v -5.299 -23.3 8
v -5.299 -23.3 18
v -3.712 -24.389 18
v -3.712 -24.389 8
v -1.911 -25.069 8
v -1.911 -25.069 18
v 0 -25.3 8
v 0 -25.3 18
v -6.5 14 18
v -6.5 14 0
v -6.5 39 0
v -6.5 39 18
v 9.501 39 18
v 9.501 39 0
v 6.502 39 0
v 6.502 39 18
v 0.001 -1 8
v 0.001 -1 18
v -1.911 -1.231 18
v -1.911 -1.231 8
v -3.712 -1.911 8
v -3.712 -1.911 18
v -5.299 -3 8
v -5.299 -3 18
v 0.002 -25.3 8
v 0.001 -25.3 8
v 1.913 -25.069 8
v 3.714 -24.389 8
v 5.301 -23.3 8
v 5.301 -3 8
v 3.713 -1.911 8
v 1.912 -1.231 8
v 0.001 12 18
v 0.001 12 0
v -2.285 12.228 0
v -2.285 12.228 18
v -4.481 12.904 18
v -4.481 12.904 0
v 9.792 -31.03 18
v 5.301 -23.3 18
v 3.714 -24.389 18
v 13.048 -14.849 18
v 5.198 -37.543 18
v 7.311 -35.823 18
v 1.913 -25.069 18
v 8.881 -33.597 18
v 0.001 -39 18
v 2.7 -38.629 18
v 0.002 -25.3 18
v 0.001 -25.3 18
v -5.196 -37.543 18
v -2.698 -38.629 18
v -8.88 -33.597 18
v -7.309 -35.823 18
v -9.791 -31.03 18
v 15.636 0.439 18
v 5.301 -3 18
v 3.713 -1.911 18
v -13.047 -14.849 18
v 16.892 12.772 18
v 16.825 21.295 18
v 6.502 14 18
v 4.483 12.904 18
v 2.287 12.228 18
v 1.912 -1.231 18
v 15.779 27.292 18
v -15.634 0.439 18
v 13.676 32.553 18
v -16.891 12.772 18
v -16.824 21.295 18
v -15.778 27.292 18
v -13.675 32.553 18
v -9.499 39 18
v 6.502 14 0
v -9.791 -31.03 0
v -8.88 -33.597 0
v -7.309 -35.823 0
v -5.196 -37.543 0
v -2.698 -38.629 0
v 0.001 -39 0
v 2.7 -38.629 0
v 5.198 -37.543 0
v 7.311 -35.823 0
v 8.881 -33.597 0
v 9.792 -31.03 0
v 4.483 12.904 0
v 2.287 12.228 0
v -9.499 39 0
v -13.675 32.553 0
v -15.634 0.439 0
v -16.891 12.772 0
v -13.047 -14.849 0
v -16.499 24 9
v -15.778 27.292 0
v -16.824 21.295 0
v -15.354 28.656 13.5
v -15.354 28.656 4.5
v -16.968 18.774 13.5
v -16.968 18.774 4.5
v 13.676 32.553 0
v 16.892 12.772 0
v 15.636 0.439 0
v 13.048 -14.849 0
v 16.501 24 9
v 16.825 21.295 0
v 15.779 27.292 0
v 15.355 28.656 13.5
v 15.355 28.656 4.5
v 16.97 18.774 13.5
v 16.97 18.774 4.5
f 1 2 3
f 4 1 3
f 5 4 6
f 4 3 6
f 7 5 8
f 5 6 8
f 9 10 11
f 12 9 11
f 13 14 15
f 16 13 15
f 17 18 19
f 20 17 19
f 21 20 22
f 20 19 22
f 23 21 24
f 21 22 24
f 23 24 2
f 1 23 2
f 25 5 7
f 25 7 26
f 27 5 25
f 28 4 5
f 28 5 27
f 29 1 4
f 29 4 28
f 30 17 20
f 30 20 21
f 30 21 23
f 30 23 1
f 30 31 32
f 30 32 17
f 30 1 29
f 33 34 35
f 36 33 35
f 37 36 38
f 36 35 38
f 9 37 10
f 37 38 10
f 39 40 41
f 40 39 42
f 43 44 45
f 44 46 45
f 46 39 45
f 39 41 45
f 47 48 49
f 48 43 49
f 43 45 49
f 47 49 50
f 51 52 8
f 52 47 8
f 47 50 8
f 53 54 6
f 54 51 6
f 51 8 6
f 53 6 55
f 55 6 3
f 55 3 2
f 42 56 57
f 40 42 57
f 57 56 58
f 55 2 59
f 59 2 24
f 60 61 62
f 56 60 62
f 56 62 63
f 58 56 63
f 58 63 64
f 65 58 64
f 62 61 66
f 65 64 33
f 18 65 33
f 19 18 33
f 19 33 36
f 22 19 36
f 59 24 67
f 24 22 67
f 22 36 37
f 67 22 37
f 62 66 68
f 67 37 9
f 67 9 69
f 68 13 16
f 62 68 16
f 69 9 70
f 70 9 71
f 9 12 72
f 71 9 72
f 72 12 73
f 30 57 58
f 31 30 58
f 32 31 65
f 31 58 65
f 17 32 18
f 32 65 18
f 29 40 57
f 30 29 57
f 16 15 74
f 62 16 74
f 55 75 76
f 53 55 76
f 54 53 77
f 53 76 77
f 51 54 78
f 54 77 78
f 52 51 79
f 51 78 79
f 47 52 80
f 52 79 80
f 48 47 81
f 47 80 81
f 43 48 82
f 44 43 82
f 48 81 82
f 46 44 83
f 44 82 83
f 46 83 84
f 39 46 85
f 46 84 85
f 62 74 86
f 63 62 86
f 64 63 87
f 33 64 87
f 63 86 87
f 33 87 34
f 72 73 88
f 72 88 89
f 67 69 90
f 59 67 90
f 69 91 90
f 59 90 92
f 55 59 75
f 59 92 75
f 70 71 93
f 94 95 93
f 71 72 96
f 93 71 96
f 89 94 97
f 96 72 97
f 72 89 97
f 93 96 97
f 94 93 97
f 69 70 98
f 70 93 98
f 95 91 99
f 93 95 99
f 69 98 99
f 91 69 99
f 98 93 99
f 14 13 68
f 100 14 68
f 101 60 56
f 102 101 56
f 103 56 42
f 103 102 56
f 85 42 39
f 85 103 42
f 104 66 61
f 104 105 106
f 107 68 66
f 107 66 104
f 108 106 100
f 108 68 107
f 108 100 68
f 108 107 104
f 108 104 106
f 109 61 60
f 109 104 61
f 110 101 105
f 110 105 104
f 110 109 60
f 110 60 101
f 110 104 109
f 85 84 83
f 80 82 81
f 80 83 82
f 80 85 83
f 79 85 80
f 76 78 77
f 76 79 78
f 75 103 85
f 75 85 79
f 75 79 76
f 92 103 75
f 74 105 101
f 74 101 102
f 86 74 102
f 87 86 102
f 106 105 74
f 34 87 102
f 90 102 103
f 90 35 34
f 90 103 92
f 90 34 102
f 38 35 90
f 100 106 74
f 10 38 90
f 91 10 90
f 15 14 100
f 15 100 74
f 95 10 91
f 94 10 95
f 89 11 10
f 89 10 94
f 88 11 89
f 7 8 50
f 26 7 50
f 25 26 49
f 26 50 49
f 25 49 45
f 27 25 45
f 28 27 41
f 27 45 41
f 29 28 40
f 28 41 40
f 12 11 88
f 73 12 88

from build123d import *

# Parameters (mm, degrees)
F1_DEPTH = 18
F3_DEPTH = 10


with BuildPart() as f1:
    # F0 (on Top) → F1 (new body)
    with BuildSketch(Plane.XY):
        with BuildLine():
            add(Edge.make_bspline(
                [(9.5007545576, 39), (12.4635481183, 34.8866982316), (20.8197259912, 23.2484041941), (14.2138642453, -9.70977485), (9.7924165598, -31.0301836975)],
                knots=[0, 0, 0, 0, 0.3533498834, 1, 1, 1, 1], degree=3))
            Line((9.5007545576, 39), (6.5015091152, 39))
            Line((6.5015091152, 39), (6.5015091152, 14))
            ThreePointArc((6.5015091152, 14), (3.4015161475, 12.5111942523), (0.0007545576, 12))
            ThreePointArc((0.0007545576, 12), (-3.4000070322, 12.5111942523), (-6.5, 14))
            Line((-6.5, 14), (-6.5, 39))
            Line((-6.5, 39), (-9.4992454424, 39))
            add(Edge.make_bspline(
                [(-9.4992454424, 39), (-12.4620390031, 34.8866982316), (-20.818216876, 23.2484041941), (-14.2123551301, -9.70977485), (-9.7909074446, -31.0301836975)],
                knots=[0, 0, 0, 0, 0.3533498834, 1, 1, 1, 1], degree=3))
            ThreePointArc((-9.7909074446, -31.0301836975), (0.0007545576, -38.9995790498), (9.7924165598, -31.0301836975))
        make_face()
    extrude(amount=F1_DEPTH)

    # F2 (on face) → F3 (cut)
    with BuildSketch(Plane.XY.offset(18)):
        with BuildLine():
            ThreePointArc((0.0007545576, -1), (-2.83164725, -1.5166352097), (-5.2992454424, -3))
            Line((-5.2992454424, -3), (-5.2992454424, -23.3))
            ThreePointArc((-5.2992454424, -23.3), (-2.8320002359, -24.7832316067), (0, -25.3))
            ThreePointArc((0, -25.3), (0.0007545576, -25.3000000355), (0.0015091152, -25.3))
            ThreePointArc((0.0015091152, -25.3), (2.8335093511, -24.7832316067), (5.3007545576, -23.3))
            Line((5.3007545576, -23.3), (5.3007545576, -3))
            ThreePointArc((5.3007545576, -3), (2.8331563653, -1.5166352097), (0.0007545576, -1))
        make_face()
    extrude(amount=-F3_DEPTH, mode=Mode.SUBTRACT)


solid = f1.part
